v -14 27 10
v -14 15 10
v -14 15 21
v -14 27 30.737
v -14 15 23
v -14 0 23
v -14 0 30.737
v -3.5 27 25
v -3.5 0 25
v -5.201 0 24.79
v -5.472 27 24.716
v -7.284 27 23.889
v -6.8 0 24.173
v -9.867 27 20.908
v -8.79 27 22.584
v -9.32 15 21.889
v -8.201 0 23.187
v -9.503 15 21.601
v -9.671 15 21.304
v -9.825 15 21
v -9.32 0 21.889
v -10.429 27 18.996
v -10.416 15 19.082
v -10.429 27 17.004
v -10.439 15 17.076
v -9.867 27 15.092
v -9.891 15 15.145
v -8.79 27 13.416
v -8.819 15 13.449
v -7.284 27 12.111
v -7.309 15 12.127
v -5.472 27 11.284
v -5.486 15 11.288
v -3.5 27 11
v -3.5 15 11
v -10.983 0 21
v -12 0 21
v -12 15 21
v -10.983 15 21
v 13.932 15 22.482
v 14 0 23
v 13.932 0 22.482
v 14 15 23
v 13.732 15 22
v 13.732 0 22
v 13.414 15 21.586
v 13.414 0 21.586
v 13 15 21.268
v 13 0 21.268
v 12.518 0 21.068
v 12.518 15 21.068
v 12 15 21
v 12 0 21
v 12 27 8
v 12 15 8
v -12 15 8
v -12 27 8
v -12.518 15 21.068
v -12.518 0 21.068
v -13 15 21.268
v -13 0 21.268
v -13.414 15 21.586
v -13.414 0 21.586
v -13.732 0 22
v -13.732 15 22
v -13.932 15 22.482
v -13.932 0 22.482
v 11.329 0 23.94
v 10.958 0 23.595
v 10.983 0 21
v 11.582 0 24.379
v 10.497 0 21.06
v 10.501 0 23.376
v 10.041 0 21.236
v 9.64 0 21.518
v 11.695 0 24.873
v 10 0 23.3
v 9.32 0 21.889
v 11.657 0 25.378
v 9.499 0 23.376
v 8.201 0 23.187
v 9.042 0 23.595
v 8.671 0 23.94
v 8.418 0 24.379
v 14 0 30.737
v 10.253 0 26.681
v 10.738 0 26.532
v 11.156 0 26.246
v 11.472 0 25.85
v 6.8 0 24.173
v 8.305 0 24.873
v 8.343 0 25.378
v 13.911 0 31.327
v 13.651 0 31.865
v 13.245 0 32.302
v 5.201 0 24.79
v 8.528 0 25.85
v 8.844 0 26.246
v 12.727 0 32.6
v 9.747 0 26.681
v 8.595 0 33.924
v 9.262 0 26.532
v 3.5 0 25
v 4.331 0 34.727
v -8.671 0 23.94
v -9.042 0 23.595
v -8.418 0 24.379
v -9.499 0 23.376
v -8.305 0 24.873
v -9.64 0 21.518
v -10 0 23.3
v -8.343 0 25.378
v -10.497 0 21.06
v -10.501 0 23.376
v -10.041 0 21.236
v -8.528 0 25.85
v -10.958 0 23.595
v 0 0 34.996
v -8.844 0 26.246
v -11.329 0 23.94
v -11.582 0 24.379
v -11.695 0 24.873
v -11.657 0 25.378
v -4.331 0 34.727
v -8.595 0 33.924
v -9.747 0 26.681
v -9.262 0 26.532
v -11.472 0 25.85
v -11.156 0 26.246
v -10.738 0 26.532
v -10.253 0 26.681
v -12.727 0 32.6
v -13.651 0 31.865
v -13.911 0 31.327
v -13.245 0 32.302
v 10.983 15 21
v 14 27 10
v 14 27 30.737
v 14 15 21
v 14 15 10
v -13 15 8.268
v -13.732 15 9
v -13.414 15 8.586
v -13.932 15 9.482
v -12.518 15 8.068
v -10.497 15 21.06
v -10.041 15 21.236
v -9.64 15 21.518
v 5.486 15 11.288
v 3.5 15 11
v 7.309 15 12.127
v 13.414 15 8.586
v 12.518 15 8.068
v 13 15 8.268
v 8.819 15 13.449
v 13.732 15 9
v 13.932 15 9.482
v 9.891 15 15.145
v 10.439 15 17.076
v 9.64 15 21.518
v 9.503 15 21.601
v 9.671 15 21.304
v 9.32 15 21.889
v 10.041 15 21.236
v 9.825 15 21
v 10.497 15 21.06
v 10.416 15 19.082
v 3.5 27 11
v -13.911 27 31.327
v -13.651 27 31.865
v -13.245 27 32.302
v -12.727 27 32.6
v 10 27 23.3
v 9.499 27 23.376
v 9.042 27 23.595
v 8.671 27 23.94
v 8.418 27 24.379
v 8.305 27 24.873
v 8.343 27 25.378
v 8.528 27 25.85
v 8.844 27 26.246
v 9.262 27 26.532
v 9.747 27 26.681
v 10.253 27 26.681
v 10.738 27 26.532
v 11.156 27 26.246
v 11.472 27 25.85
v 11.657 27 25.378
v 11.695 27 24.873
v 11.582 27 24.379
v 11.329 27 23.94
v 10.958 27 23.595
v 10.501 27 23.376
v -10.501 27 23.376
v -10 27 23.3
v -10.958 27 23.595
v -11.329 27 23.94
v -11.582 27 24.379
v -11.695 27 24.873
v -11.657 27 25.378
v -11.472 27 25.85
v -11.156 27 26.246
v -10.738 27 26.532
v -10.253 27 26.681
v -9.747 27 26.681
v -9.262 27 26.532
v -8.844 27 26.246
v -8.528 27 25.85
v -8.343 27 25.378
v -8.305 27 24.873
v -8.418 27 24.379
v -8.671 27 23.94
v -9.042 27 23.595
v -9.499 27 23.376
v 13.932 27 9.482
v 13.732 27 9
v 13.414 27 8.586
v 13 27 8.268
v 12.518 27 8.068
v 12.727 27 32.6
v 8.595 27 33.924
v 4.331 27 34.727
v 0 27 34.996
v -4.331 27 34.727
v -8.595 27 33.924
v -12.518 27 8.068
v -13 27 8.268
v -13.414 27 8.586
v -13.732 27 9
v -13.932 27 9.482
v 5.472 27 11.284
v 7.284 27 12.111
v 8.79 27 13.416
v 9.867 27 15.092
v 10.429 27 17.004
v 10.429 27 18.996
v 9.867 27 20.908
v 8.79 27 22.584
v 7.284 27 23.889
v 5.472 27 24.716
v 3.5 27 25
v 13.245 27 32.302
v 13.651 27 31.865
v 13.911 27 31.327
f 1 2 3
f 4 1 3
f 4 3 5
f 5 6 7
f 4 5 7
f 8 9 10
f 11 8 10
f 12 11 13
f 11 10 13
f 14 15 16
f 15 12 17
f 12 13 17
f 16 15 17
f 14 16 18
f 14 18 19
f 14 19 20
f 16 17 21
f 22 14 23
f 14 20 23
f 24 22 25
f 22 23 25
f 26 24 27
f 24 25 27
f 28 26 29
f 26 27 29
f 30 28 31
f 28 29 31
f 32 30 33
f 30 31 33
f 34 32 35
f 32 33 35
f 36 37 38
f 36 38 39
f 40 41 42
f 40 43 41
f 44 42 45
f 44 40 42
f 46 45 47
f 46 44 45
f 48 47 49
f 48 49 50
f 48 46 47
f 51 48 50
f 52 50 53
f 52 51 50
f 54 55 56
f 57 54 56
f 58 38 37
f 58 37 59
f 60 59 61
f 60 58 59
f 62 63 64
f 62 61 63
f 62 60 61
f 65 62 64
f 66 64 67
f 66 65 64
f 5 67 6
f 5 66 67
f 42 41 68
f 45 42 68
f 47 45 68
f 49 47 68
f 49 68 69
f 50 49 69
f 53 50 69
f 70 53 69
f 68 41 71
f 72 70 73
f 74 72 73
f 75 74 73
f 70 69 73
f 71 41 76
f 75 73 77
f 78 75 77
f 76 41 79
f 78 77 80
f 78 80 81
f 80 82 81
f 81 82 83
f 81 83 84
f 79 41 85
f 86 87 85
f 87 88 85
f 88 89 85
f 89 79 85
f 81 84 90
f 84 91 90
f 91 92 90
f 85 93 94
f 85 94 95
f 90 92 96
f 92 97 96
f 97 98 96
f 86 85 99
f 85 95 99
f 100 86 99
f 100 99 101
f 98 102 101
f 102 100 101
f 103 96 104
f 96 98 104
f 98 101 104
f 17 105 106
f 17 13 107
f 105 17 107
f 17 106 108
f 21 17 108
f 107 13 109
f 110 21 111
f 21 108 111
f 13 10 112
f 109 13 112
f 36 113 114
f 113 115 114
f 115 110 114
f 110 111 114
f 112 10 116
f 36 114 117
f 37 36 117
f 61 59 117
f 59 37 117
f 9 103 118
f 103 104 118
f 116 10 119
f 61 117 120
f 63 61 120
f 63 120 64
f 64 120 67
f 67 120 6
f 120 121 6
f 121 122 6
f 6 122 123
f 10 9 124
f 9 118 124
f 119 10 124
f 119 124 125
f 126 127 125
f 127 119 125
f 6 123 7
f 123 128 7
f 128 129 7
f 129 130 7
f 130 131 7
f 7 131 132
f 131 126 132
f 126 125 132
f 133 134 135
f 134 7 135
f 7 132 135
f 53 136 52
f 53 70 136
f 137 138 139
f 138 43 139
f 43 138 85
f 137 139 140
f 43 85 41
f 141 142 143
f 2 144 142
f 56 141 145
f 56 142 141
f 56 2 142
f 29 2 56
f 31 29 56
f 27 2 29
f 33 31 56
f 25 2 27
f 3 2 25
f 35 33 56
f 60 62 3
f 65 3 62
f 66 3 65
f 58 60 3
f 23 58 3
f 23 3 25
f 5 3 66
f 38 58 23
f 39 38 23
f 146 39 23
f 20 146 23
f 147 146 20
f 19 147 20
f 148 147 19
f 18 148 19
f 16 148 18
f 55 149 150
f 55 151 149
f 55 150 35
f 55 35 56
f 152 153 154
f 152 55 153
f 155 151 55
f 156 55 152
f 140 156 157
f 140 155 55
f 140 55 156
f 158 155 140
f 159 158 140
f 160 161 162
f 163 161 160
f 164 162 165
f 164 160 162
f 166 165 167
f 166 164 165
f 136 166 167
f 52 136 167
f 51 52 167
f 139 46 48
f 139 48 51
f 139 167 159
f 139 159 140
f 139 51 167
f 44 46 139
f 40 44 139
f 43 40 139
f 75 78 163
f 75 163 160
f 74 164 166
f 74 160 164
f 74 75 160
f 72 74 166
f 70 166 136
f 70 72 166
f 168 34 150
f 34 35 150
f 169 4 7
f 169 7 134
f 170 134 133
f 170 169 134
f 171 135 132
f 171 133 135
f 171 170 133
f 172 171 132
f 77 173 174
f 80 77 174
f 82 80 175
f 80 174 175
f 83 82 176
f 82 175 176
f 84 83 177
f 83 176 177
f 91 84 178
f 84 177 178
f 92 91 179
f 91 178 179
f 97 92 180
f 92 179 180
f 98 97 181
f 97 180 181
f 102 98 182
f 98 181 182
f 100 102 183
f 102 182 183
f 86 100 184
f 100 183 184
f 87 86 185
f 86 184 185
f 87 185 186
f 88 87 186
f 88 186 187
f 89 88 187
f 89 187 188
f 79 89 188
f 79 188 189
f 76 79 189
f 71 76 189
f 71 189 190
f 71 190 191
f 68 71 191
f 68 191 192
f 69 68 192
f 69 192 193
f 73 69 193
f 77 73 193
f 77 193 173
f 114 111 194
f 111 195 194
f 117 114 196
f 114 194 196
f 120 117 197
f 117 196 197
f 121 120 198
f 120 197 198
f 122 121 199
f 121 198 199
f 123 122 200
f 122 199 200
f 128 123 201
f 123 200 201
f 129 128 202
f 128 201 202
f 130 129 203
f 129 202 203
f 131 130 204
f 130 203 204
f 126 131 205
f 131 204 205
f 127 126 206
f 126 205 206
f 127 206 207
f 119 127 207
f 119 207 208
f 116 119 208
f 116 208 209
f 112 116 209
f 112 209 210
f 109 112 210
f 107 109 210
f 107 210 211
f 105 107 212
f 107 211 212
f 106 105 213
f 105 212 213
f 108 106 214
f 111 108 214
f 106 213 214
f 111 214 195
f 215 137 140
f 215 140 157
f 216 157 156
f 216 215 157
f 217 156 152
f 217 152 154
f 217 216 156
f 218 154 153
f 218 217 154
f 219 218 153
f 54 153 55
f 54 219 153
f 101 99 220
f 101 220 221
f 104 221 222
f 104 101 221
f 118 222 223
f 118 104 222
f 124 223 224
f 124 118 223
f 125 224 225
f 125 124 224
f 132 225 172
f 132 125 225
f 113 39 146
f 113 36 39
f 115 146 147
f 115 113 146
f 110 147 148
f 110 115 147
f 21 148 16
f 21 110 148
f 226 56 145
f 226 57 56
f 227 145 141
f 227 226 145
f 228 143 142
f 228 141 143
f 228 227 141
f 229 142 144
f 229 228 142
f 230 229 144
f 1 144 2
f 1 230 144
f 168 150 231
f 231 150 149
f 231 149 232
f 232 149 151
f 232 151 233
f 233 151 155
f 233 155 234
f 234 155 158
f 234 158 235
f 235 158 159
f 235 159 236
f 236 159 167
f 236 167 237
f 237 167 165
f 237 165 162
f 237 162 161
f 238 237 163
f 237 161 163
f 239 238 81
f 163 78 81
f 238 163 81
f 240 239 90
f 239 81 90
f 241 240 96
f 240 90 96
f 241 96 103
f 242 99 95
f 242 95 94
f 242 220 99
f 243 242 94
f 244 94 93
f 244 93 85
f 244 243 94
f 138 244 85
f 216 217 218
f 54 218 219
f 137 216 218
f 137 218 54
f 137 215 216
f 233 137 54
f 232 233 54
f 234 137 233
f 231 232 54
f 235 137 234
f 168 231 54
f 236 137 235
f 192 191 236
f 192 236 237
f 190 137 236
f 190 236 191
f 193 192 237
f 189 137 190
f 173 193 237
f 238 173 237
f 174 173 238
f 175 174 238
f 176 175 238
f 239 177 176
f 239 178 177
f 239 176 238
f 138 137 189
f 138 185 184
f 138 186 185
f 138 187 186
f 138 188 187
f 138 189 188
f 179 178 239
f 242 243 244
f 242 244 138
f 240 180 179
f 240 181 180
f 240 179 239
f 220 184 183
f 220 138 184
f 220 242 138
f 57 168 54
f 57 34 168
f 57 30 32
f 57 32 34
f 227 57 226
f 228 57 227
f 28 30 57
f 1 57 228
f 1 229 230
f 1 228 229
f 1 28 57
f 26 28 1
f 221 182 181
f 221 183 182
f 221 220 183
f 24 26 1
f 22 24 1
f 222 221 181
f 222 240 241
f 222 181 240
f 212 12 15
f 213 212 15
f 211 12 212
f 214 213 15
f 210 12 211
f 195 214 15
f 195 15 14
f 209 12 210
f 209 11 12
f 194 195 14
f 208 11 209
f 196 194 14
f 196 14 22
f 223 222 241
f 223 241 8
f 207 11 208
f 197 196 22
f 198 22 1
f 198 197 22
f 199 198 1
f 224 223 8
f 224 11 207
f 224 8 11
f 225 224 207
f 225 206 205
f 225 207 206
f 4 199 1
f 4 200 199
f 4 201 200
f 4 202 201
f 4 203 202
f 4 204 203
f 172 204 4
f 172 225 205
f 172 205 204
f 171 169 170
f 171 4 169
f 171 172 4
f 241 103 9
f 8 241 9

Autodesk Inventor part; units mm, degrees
ref_plane "YZ Plane" through (0, 0, 0) normal (1, 0, 0) x (0, 1, 0)
ref_plane "XZ Plane" through (0, 0, 0) normal (0, 1, 0) x (-1, 0, 0)
ref_plane "XY Plane" through (0, 0, 0) normal (0, 0, 1) x (1, 0, 0)
sketch "スケッチ1" plane through (0, 0, 0) normal (0, 1, 0) x (-1, 0, 0)
  circle A0 centre (0, 0) radius 34.996
  circle A1 centre (0, 18) radius 10
  line L0 (48.9944, 0) -> (-48.9944, 0) projected
  line L1 (-14, 8) -> (14, 8)
  line L2 (14, 8) -> (14, 32.0737)
  line L3 (14, 32.0737) -> (-14, 32.0737)
  line L4 (-14, 32.0737) -> (-14, 8)
  line L5 (-14, 8) -> (14, 32.0737) construction
  line L6 (14, 8) -> (-14, 32.0737) construction
  point P0 (10, 25)
  point P1 (-10, 25)
  point P2 (0, 20.0368)
  dimension "d0" = 25
  dimension "d1" = 10
  dimension "d2" = 10
  dimension "d3" = 69.992
  dimension "d5" = 20
  dimension "d7" = 18
  dimension "d8" = 4
extrude "押し出し1" add sketch "スケッチ1" along normal blind 27 contours L3 A0 | A1 | L2 L1 L4 L3
hole "穴1" at (-10, 0, 25) at (10, 0, 25) direction (0, 1, 0) diameter 3.4 end through all clearance for "Flat Head Machine Screw" size "M3" standard "Ansi Metric M Profile"
sketch "スケッチ2" plane through (0, 0, 0) normal (0, -1, 0) x (1, 0, 0)
  circle A0 centre (3.5, 18) radius 7 construction
  circle A1 centre (-7, 18) radius 3.5 construction
  line L0 (-3.5, 18) -> (3.5, 18) construction
  line L1 (-3.5, 11) -> (3.5, 11)
  line L2 (3.5, 25) -> (-3.5, 25)
  arc A2 (-3.5, 25) -> (-3.5, 11) centre (-3.5, 18) ccw
  arc A3 (3.5, 11) -> (3.5, 25) centre (3.5, 18) ccw
  point P0 (0, 0)
  point P1 (0, 18)
  point P2 (-10.5, 18)
  dimension "d31" = 7
  dimension "d30" = 14
  dimension "d32" = 7
extrude "押し出し2" cut sketch "スケッチ2" against normal through all
sketch "スケッチ3" plane through (0, 0, 0) normal (0, -1, 0) x (1, 0, 0)
  line L0 (14, 8) -> (-14, 8) projected
  line L1 (14, -21) -> (-14, -21)
  line L2 (-14, -21) -> (-14, 21)
  line L3 (-14, 21) -> (14, 21)
  line L4 (14, 21) -> (14, -21)
  line L5 (14, -21) -> (-14, 21) construction
  line L6 (-14, -21) -> (14, 21) construction
  circle A0 centre (-10, 25) radius 1.7 projected
  point P0 (0, 0)
  point P1 (-14, 8)
  dimension "d25" = 4
extrude "押し出し3" cut sketch "スケッチ3" against normal blind 15 contours L0 L2 L3 L4
fillet "フィレット2" radius 2 8 edges at (14, 21, 8) (14, 7.5, 21) (-14, 7.5, 21) (-14, 21, 8) (14, 13.5, 32.0737) (-14, 13.5, 32.0737) (9.8246, 7.5, 21) (-9.8246, 7.5, 21)
equation "\"d2\" = d1"
equation "\"d32\" = 0.5 * d30"
properties part number "scara-base13" material "ABS プラスチック"
